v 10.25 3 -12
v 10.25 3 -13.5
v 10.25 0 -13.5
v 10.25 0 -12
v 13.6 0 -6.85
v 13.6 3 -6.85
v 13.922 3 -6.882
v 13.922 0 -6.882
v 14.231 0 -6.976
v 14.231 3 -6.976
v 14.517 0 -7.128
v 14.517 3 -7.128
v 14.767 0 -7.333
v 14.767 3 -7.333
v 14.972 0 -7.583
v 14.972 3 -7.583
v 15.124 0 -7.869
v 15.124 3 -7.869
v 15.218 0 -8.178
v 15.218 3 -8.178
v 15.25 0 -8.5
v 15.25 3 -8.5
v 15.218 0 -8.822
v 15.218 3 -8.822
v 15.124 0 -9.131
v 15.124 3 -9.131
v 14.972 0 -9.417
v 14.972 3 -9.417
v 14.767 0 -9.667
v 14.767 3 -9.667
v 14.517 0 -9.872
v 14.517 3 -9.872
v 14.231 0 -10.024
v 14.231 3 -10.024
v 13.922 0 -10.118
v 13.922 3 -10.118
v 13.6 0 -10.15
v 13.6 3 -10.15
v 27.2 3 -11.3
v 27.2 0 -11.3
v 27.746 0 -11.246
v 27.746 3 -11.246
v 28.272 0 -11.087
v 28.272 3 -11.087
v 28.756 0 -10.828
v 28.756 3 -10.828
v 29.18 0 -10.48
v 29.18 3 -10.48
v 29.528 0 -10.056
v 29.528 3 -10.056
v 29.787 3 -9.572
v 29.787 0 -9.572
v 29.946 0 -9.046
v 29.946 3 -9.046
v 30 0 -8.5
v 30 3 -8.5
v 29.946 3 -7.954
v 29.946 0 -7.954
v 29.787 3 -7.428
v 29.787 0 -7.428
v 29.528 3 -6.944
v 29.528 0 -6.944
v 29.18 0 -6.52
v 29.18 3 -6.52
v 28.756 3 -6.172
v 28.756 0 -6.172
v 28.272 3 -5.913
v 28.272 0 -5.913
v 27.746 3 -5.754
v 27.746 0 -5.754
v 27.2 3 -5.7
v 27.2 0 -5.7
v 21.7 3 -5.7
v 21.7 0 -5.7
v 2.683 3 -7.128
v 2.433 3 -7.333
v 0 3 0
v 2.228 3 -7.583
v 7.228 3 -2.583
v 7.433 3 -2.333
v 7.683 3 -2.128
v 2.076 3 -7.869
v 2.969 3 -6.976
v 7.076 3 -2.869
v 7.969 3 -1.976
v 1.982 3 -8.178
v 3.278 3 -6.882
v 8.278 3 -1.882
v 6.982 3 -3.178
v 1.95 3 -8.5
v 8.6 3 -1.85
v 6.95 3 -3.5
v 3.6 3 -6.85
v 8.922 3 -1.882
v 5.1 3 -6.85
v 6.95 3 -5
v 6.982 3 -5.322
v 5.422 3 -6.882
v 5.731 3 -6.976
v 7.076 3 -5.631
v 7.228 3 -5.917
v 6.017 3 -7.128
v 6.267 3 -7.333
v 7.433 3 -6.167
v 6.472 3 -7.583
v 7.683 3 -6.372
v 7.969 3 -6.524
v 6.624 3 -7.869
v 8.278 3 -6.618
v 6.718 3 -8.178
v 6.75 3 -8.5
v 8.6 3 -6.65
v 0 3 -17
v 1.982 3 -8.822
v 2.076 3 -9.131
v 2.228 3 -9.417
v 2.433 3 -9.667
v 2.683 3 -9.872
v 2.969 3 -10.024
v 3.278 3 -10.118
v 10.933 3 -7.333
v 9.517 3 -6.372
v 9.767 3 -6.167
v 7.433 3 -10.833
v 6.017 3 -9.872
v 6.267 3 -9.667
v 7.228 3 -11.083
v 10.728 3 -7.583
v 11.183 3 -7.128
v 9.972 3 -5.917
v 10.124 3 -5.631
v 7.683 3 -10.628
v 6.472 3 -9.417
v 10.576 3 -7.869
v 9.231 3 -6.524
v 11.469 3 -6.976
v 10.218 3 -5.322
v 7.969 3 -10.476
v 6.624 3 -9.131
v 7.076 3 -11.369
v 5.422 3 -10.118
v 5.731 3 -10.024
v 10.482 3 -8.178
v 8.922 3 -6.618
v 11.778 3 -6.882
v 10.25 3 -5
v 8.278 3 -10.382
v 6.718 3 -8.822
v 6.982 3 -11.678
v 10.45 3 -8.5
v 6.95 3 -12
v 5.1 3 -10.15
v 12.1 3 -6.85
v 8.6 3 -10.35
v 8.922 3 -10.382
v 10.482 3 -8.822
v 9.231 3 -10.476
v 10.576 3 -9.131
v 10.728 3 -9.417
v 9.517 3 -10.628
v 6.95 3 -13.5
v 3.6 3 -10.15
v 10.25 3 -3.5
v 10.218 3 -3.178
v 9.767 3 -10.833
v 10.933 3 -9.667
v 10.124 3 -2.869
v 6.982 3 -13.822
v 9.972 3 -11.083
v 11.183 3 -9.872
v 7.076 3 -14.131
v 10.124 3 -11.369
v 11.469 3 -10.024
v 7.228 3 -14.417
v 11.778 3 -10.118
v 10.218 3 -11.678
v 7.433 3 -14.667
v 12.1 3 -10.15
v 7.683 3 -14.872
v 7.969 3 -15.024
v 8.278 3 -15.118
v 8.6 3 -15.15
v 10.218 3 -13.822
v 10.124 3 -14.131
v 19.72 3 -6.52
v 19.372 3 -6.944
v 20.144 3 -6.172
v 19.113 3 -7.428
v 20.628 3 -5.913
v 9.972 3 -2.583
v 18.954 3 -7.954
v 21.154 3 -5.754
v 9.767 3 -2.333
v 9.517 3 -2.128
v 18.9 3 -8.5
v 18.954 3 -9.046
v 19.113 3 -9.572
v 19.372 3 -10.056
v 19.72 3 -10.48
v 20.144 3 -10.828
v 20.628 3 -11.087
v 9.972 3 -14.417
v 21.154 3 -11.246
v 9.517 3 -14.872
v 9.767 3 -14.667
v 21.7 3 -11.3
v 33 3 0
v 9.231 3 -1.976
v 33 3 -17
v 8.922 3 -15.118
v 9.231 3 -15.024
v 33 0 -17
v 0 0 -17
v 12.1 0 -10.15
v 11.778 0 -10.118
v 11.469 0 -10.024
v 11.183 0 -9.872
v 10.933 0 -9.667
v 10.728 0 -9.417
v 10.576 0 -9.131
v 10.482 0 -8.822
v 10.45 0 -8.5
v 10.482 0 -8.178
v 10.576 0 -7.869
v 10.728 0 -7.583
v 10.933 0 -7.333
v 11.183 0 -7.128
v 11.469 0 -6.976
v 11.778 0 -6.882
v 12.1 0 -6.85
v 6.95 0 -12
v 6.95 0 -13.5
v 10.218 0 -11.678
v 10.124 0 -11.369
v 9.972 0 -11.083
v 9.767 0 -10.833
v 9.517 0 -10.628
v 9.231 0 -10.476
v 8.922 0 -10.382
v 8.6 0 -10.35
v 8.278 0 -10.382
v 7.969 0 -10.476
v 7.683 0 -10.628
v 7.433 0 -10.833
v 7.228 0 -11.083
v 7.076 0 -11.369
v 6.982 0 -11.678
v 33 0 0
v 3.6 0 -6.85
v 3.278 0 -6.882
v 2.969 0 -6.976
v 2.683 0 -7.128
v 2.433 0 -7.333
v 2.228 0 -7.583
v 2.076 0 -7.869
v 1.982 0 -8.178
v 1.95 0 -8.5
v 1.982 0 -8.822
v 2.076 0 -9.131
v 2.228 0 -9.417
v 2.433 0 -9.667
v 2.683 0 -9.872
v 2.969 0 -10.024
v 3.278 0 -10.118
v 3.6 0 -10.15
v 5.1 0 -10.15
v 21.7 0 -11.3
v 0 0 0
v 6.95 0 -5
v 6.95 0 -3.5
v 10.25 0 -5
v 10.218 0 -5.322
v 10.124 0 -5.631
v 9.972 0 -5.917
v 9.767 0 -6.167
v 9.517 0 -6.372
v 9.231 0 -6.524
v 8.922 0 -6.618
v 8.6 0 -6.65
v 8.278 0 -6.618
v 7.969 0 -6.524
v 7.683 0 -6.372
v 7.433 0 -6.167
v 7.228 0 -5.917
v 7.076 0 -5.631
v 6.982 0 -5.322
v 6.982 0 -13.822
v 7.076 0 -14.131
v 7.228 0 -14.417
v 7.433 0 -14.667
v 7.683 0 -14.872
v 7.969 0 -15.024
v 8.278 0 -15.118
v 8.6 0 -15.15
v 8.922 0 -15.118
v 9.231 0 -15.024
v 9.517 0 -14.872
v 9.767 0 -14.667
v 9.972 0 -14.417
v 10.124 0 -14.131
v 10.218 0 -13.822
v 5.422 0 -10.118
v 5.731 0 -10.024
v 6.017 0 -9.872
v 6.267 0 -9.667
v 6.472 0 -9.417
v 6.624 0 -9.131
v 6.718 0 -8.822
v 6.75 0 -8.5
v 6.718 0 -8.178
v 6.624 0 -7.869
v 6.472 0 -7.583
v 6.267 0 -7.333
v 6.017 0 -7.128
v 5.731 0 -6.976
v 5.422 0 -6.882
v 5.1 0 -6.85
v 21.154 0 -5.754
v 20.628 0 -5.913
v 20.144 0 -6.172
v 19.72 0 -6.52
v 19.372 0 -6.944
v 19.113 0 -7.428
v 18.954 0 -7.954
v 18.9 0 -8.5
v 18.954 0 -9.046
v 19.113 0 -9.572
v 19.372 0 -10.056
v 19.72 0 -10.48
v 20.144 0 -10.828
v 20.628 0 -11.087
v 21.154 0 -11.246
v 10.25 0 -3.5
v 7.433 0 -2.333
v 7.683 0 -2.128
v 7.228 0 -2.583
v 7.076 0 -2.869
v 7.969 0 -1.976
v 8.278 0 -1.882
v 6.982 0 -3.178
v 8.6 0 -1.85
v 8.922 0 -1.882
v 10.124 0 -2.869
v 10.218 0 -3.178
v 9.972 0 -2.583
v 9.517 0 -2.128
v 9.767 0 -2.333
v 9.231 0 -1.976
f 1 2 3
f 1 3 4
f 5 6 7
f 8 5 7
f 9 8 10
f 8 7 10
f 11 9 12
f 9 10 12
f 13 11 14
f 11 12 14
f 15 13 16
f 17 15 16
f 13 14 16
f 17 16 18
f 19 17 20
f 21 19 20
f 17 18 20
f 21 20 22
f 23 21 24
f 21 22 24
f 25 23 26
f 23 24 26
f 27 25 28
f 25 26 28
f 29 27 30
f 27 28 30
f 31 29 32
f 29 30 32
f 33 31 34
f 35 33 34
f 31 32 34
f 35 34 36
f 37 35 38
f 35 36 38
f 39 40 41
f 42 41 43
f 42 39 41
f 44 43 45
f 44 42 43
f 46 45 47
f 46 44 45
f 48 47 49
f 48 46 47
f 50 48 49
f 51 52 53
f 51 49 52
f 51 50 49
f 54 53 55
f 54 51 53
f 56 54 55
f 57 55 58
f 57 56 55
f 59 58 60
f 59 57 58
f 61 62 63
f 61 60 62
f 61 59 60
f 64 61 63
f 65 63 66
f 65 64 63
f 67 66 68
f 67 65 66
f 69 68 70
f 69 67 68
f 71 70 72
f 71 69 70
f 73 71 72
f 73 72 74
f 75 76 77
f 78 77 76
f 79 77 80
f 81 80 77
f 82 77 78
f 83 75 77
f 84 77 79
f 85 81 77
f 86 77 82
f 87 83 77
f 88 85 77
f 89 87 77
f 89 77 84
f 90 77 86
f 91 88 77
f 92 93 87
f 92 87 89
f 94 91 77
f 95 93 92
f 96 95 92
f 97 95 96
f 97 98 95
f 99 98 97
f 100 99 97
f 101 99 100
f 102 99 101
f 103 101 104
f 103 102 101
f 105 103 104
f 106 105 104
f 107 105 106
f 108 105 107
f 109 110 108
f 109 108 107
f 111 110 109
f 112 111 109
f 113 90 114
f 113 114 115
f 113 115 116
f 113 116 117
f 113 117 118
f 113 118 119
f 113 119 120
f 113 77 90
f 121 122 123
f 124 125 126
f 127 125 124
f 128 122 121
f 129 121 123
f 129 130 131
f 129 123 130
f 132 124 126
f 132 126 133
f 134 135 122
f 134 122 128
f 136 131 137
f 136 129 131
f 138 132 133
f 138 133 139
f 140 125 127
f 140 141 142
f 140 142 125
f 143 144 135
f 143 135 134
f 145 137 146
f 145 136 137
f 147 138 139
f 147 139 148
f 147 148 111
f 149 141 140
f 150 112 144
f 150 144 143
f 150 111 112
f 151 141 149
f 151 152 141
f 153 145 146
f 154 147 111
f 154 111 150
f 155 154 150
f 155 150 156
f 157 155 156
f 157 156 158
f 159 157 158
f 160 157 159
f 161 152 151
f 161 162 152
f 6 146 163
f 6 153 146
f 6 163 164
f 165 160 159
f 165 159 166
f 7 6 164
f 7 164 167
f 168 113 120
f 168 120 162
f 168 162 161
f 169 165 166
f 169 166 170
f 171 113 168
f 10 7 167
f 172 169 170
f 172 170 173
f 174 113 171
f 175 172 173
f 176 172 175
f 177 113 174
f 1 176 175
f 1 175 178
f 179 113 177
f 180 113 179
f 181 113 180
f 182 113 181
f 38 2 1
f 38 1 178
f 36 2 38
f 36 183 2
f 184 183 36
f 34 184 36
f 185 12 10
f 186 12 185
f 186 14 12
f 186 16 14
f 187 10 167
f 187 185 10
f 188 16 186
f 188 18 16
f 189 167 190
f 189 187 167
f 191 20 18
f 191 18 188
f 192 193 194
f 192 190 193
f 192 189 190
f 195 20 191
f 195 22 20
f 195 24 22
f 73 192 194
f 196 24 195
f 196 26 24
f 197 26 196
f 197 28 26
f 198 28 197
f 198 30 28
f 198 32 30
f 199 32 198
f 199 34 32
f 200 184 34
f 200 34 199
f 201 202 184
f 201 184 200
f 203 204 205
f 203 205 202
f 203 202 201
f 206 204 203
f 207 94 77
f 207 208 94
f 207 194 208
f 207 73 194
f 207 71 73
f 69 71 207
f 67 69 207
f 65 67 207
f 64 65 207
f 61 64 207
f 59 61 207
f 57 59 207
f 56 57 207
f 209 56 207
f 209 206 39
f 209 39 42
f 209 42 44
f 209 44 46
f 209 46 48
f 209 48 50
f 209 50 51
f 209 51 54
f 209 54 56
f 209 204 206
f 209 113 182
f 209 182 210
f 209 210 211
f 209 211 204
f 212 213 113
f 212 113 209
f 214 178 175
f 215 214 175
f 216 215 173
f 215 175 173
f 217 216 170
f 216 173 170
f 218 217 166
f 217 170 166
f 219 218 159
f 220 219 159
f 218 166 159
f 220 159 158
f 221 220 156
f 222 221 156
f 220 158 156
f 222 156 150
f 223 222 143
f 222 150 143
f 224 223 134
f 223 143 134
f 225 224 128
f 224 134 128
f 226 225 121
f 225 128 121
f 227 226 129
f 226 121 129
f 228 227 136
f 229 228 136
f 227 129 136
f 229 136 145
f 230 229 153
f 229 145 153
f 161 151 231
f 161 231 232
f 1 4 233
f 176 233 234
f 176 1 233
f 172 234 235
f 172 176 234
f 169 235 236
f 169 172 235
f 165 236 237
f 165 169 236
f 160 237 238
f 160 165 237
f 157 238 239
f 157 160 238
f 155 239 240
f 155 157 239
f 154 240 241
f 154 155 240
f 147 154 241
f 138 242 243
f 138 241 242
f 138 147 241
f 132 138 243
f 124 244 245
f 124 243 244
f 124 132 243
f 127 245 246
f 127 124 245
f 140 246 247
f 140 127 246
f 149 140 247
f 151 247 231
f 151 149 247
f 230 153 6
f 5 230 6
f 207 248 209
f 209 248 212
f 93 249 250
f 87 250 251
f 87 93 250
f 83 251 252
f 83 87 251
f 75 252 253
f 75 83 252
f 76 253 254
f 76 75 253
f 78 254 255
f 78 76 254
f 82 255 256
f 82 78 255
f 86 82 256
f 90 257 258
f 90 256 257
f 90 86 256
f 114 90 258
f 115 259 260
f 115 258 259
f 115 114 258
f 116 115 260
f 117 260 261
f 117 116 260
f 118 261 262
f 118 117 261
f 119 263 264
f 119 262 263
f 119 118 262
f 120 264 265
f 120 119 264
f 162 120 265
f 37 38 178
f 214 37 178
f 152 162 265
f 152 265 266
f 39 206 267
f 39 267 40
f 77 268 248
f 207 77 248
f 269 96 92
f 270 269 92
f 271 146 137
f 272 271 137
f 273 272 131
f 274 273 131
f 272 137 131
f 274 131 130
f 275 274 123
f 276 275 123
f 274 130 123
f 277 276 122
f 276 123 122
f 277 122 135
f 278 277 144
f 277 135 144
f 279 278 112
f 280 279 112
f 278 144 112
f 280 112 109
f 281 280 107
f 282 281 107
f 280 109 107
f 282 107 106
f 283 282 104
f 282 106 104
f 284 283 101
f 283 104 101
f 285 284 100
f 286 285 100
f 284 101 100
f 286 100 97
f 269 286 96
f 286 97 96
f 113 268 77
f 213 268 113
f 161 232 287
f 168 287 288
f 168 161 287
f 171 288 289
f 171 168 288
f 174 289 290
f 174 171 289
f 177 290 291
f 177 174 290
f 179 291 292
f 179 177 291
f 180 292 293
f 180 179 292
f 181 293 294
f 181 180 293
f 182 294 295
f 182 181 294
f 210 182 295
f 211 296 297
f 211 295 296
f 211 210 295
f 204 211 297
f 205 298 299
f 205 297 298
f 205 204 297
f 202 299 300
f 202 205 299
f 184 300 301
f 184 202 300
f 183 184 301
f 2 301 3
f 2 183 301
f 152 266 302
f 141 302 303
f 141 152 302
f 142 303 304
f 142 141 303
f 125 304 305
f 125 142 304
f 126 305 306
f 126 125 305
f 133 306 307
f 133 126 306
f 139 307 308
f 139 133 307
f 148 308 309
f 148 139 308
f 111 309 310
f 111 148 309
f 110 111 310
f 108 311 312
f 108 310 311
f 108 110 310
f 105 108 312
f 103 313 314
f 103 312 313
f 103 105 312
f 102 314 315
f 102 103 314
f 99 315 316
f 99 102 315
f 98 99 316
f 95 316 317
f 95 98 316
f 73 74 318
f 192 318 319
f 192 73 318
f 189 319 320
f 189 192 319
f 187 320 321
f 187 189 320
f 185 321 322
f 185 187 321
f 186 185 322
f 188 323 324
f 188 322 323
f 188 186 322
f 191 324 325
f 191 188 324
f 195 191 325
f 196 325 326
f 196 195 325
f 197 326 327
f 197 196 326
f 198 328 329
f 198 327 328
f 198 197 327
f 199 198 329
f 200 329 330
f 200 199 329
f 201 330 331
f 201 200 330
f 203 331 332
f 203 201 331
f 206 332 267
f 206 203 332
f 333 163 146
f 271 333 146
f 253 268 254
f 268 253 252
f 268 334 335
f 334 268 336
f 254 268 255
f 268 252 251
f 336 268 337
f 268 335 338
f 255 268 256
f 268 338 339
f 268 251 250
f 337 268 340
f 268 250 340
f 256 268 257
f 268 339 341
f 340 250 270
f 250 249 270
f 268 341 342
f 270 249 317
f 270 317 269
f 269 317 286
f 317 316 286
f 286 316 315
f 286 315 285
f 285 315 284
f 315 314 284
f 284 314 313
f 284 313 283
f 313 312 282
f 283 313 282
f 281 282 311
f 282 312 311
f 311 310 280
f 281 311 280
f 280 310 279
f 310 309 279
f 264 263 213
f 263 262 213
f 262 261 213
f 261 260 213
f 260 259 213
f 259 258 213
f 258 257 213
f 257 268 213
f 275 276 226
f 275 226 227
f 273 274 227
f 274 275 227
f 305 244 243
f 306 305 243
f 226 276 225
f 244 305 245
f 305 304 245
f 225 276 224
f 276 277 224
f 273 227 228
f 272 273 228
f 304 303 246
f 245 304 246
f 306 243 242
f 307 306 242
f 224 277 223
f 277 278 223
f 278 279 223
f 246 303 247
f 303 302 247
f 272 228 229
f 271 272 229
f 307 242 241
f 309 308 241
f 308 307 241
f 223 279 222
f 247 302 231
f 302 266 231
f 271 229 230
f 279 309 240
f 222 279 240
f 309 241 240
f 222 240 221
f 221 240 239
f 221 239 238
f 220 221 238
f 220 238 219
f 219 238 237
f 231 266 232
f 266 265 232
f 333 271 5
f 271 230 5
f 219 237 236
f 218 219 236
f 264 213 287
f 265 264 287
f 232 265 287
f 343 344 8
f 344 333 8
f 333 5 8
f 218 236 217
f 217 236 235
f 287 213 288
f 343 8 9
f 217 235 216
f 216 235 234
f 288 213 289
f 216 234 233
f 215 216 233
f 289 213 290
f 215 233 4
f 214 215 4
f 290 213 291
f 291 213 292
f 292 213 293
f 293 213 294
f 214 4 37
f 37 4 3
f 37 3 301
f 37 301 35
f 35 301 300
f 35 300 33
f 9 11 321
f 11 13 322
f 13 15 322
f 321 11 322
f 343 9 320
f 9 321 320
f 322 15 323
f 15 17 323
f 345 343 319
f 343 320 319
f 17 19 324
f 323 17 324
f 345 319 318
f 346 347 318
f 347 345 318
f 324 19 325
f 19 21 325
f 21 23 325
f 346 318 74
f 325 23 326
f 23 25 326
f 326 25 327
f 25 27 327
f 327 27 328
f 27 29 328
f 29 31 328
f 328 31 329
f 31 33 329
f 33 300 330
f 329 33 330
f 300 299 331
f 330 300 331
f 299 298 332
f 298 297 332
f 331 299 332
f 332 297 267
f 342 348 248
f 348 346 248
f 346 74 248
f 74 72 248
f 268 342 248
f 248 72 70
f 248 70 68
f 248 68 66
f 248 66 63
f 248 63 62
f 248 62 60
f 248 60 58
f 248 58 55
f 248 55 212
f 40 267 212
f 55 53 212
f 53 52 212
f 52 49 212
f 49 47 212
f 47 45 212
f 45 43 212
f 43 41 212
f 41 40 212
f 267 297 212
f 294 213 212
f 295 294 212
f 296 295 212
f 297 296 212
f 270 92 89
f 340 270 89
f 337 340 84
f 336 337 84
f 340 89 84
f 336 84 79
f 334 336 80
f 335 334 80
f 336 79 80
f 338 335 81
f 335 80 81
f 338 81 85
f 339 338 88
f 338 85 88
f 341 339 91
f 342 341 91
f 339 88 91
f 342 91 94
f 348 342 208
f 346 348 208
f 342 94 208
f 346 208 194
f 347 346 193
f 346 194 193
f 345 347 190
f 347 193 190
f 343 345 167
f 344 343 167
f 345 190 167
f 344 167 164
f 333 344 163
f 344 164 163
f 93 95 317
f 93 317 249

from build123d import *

# Parameters (mm, degrees)
SKETCH1_W           = 33
SKETCH1_H           = 17
BOSS_EXTRUDE1_DEPTH = 3
CUT_EXTRUDE1_DEPTH  = 4


with BuildPart() as part:
    # Sketch1 → Boss-Extrude1 (new body)
    with BuildSketch(Plane(origin=(0, 0, 0), x_dir=(1, 0, 0), z_dir=(0, 1, 0))):
        with Locations((16.5, 8.5)):
            Rectangle(SKETCH1_W, SKETCH1_H)
    extrude(amount=BOSS_EXTRUDE1_DEPTH)

    # Sketch2 → Cut-Extrude1 (cut, through all)
    with BuildSketch(Plane(origin=(0, 3, 0), x_dir=(1, 0, 0), z_dir=(0, 1, 0))):
        with BuildLine():
            Line((21.7, 11.3), (27.2, 11.3))
            ThreePointArc((27.2, 11.3), (30, 8.5), (27.2, 5.7))
            Line((27.2, 5.7), (21.7, 5.7))
            ThreePointArc((21.7, 5.7), (18.9, 8.5), (21.7, 11.3))
        make_face()
        with BuildLine():
            Line((6.95, 12), (6.95, 13.5))
            ThreePointArc((6.95, 13.5), (8.6, 15.15), (10.25, 13.5))
            Line((10.25, 13.5), (10.25, 12))
            ThreePointArc((10.25, 12), (8.6, 10.35), (6.95, 12))
        make_face()
        with BuildLine():
            Line((3.6, 10.15), (5.1, 10.15))
            ThreePointArc((5.1, 10.15), (6.75, 8.5), (5.1, 6.85))
            Line((5.1, 6.85), (3.6, 6.85))
            ThreePointArc((3.6, 6.85), (1.95, 8.5), (3.6, 10.15))
        make_face()
        with BuildLine():
            Line((13.6, 10.15), (12.1, 10.15))
            ThreePointArc((12.1, 10.15), (10.45, 8.5), (12.1, 6.85))
            Line((12.1, 6.85), (13.6, 6.85))
            ThreePointArc((13.6, 6.85), (15.25, 8.5), (13.6, 10.15))
        make_face()
        with BuildLine():
            Line((6.95, 5), (6.95, 3.5))
            ThreePointArc((6.95, 3.5), (8.6, 1.85), (10.25, 3.5))
            Line((10.25, 3.5), (10.25, 5))
            ThreePointArc((10.25, 5), (8.6, 6.65), (6.95, 5))
        make_face()
    extrude(amount=-CUT_EXTRUDE1_DEPTH, mode=Mode.SUBTRACT)


solid = part.part
